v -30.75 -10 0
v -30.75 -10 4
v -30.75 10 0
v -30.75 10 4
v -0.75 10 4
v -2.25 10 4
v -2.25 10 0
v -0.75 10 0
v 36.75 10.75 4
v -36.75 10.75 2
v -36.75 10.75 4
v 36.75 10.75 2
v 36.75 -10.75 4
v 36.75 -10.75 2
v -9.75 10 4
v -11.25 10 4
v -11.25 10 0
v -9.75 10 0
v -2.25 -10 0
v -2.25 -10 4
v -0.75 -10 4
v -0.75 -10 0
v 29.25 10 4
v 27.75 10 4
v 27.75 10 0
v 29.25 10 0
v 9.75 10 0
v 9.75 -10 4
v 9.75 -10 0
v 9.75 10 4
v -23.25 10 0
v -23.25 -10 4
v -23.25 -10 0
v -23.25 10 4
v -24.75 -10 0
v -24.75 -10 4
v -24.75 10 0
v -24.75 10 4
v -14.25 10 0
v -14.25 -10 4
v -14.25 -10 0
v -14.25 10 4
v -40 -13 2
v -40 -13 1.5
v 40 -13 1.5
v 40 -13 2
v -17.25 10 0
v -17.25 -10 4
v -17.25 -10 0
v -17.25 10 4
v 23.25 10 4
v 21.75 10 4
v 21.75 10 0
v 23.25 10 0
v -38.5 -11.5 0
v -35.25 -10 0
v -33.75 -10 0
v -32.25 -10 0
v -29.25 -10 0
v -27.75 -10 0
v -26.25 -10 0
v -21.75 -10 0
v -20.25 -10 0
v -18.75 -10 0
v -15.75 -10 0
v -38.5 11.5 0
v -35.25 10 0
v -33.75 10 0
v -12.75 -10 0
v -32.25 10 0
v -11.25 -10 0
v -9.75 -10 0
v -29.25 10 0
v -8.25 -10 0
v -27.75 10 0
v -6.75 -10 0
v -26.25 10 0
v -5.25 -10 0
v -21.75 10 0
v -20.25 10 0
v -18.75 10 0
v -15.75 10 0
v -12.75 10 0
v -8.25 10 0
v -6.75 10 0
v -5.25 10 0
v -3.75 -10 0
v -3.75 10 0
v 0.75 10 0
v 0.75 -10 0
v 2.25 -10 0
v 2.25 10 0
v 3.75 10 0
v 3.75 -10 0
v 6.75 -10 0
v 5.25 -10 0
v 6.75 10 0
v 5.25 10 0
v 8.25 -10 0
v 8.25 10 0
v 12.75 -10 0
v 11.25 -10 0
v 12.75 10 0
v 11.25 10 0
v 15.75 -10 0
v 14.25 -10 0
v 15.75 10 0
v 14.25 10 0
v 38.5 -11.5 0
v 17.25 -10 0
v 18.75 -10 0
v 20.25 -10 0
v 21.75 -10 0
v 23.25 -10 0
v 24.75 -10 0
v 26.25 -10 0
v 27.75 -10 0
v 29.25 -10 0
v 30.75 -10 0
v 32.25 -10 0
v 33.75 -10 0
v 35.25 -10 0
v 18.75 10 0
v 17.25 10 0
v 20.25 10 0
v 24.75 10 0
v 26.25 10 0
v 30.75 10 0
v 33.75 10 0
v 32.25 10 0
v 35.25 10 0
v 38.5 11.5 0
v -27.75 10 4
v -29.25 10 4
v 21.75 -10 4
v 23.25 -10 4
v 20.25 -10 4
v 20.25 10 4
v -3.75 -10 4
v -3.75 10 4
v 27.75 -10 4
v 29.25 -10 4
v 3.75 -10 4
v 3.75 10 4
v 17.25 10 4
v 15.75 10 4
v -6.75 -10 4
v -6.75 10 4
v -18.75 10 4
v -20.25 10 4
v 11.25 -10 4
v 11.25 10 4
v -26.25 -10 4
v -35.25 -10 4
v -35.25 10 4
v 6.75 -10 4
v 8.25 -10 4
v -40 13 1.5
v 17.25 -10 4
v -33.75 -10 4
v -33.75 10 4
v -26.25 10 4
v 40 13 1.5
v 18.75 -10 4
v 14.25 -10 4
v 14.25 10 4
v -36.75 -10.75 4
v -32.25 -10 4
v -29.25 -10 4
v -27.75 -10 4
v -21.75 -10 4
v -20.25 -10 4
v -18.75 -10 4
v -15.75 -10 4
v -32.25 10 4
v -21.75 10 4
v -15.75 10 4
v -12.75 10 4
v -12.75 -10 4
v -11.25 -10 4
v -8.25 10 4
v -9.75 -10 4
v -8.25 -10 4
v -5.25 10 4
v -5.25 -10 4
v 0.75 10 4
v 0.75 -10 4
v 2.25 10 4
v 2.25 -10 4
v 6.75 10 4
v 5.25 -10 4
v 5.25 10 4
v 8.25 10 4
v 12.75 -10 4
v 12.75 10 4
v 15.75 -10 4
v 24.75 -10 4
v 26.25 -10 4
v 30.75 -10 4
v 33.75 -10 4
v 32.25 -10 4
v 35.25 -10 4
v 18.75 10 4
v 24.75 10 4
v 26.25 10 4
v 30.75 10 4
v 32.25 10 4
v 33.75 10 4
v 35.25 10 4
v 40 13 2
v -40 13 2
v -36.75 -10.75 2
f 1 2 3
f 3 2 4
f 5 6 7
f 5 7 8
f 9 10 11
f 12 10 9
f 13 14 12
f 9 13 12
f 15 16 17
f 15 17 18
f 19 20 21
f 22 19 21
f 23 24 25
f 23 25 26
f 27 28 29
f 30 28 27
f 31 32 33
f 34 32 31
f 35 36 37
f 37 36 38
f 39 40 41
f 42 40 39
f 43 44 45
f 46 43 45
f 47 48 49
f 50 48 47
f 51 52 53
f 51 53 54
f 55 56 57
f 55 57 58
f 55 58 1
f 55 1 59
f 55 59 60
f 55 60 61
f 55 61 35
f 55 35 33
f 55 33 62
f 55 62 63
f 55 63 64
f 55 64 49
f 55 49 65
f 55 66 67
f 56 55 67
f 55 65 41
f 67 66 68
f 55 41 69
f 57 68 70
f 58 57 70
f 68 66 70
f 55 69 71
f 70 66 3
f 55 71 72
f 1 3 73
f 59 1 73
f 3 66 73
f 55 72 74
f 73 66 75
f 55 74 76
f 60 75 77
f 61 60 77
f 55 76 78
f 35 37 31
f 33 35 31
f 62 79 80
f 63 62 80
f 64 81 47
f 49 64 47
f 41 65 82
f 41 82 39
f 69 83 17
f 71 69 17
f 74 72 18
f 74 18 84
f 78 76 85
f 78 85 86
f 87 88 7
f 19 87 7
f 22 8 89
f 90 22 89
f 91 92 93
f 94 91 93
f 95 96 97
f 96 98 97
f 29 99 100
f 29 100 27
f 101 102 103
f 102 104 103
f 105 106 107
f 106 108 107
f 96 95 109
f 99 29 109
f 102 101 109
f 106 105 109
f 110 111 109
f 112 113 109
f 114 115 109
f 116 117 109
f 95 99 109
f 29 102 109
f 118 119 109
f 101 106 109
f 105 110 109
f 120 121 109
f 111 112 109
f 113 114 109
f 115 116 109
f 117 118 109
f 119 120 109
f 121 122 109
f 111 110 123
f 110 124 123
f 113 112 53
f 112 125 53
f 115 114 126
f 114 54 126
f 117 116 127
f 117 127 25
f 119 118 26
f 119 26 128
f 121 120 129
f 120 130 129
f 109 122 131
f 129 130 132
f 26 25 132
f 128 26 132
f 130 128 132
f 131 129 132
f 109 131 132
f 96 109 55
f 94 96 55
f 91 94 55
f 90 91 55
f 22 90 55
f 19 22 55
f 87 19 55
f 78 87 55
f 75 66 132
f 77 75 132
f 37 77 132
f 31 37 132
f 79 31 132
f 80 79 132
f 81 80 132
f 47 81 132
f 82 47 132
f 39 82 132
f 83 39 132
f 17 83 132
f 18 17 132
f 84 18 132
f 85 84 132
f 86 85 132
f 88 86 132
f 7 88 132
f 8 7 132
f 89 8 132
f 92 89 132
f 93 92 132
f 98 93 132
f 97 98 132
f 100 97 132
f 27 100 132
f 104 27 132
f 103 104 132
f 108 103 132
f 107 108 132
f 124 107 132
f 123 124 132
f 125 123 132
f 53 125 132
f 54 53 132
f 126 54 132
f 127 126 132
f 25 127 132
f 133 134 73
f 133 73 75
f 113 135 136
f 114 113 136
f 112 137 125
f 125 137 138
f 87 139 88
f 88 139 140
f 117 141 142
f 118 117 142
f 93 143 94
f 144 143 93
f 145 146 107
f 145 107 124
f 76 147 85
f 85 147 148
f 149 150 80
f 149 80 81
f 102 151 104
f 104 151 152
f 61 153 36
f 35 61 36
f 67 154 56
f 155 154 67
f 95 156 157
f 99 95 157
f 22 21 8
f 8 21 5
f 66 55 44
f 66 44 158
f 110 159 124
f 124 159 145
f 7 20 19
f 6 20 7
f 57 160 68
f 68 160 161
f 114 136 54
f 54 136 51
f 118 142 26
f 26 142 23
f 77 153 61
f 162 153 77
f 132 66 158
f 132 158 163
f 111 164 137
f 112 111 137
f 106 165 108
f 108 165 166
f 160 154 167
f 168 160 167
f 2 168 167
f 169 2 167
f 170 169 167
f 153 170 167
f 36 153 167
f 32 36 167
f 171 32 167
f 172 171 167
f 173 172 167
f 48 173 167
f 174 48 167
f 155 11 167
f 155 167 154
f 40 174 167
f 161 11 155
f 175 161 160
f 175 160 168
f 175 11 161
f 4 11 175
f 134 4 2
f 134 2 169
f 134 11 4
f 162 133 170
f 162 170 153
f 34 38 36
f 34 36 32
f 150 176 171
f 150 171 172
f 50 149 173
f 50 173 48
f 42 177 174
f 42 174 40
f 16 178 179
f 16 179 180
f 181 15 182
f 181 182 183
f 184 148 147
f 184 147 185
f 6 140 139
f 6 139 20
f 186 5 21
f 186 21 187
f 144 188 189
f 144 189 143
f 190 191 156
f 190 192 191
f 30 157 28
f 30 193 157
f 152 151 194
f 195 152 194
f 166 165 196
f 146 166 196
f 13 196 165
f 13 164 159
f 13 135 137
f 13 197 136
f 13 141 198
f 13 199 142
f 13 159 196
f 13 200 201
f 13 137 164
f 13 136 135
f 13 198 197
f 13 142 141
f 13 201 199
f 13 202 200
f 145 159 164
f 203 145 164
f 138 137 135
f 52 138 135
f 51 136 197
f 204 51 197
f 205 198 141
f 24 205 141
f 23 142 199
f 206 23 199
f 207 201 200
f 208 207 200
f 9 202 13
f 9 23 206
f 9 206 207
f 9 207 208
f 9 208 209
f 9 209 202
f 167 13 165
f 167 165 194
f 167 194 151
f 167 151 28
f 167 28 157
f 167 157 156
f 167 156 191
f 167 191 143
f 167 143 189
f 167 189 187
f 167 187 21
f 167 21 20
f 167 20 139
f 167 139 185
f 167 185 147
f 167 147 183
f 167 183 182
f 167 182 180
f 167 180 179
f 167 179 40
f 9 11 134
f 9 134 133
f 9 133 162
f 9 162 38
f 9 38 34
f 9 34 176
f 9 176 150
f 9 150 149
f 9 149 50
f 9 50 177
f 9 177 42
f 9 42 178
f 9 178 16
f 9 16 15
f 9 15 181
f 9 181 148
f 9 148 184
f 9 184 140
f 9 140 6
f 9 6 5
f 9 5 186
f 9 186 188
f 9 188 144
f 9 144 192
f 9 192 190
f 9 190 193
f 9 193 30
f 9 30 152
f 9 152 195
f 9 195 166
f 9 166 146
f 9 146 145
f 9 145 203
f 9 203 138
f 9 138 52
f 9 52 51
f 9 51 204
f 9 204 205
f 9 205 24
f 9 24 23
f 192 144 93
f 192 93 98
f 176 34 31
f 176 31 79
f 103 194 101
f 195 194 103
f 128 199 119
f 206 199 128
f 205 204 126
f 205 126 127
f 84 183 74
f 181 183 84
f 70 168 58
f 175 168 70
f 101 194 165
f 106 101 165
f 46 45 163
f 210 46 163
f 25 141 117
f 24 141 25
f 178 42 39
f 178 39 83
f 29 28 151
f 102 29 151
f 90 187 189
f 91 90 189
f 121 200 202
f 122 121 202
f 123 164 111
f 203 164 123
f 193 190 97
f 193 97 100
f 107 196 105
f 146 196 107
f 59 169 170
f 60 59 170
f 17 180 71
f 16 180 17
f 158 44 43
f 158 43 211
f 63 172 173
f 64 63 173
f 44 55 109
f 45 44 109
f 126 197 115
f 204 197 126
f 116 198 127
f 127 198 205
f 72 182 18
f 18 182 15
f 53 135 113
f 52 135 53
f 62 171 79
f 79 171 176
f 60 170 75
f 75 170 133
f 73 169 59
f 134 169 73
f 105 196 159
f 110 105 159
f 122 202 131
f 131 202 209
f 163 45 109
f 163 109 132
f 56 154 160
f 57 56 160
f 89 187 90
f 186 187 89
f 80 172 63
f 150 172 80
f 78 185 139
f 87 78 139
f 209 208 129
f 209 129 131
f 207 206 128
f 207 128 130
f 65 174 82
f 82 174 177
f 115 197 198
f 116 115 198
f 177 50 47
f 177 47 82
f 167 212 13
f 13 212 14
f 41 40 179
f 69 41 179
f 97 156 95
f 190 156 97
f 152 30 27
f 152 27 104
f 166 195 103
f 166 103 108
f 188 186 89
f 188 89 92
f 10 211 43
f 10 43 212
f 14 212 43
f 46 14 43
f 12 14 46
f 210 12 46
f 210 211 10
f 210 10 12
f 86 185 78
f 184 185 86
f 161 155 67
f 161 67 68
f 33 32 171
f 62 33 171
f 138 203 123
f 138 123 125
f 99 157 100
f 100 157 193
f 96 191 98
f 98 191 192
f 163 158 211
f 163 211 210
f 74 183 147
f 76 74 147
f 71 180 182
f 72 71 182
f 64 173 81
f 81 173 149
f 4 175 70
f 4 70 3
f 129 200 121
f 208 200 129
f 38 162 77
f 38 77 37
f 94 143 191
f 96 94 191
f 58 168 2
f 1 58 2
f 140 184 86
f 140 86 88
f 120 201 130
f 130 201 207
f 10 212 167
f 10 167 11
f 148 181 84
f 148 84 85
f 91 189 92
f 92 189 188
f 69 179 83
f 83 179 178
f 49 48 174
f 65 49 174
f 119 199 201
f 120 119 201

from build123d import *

# Parameters (mm, degrees)
SKETCH_W     = 80
SKETCH_H     = 26
PAD_DEPTH    = 2
SKETCH001_W  = 73.5
SKETCH001_H  = 21.5
PAD001_DEPTH = 2
SKETCH002_W  = 1.5
SKETCH002_H  = 20
POCKET_DEPTH = 5
CHAMFER_SIZE = 1.5


with BuildPart() as part:
    # Sketch → Pad (new body)
    with BuildSketch(Plane.XY):
        Rectangle(SKETCH_W, SKETCH_H)
    extrude(amount=PAD_DEPTH)

    # Sketch001 (on Face6 of Pad) → Pad001 (join)
    with BuildSketch(Plane.XY.offset(2)):
        Rectangle(SKETCH001_W, SKETCH001_H)
    extrude(amount=PAD001_DEPTH)

    # Sketch002 (on Face11 of Pad001) → Pocket (cut)
    with BuildSketch(Plane.XY.offset(4)):
        with Locations((1.5, 0)):
            Rectangle(SKETCH002_W, SKETCH002_H)
        with Locations((4.5, 0)):
            Rectangle(SKETCH002_W, SKETCH002_H)
        with Locations((7.5, 0)):
            Rectangle(SKETCH002_W, SKETCH002_H)
        with Locations((10.5, 0)):
            Rectangle(SKETCH002_W, SKETCH002_H)
        with Locations((13.5, 0)):
            Rectangle(SKETCH002_W, SKETCH002_H)
        with Locations((16.5, 0)):
            Rectangle(SKETCH002_W, SKETCH002_H)
        with Locations((19.5, 0)):
            Rectangle(SKETCH002_W, SKETCH002_H)
        with Locations((22.5, 0)):
            Rectangle(SKETCH002_W, SKETCH002_H)
        with Locations((25.5, 0)):
            Rectangle(SKETCH002_W, SKETCH002_H)
        with Locations((28.5, 0)):
            Rectangle(SKETCH002_W, SKETCH002_H)
        with Locations((31.5, 0)):
            Rectangle(SKETCH002_W, SKETCH002_H)
        with Locations((34.5, 0)):
            Rectangle(SKETCH002_W, SKETCH002_H)
        with Locations((-1.5, 0)):
            Rectangle(SKETCH002_W, SKETCH002_H)
        with Locations((-4.5, 0)):
            Rectangle(SKETCH002_W, SKETCH002_H)
        with Locations((-7.5, 0)):
            Rectangle(SKETCH002_W, SKETCH002_H)
        with Locations((-10.5, 0)):
            Rectangle(SKETCH002_W, SKETCH002_H)
        with Locations((-13.5, 0)):
            Rectangle(SKETCH002_W, SKETCH002_H)
        with Locations((-16.5, 0)):
            Rectangle(SKETCH002_W, SKETCH002_H)
        with Locations((-19.5, 0)):
            Rectangle(SKETCH002_W, SKETCH002_H)
        with Locations((-22.5, 0)):
            Rectangle(SKETCH002_W, SKETCH002_H)
        with Locations((-25.5, 0)):
            Rectangle(SKETCH002_W, SKETCH002_H)
        with Locations((-28.5, 0)):
            Rectangle(SKETCH002_W, SKETCH002_H)
        with Locations((-31.5, 0)):
            Rectangle(SKETCH002_W, SKETCH002_H)
        with Locations((-34.5, 0)):
            Rectangle(SKETCH002_W, SKETCH002_H)
    extrude(amount=-POCKET_DEPTH, mode=Mode.SUBTRACT)

    # Chamfer
    chamfer_edges = [part.edges().sort_by_distance(p)[0] for p in [
        (0, -13, 0),
        (40, 0, 0),
        (0, 13, 0),
        (-40, 0, 0),
    ]]
    chamfer(chamfer_edges, length=CHAMFER_SIZE)


solid = part.part
